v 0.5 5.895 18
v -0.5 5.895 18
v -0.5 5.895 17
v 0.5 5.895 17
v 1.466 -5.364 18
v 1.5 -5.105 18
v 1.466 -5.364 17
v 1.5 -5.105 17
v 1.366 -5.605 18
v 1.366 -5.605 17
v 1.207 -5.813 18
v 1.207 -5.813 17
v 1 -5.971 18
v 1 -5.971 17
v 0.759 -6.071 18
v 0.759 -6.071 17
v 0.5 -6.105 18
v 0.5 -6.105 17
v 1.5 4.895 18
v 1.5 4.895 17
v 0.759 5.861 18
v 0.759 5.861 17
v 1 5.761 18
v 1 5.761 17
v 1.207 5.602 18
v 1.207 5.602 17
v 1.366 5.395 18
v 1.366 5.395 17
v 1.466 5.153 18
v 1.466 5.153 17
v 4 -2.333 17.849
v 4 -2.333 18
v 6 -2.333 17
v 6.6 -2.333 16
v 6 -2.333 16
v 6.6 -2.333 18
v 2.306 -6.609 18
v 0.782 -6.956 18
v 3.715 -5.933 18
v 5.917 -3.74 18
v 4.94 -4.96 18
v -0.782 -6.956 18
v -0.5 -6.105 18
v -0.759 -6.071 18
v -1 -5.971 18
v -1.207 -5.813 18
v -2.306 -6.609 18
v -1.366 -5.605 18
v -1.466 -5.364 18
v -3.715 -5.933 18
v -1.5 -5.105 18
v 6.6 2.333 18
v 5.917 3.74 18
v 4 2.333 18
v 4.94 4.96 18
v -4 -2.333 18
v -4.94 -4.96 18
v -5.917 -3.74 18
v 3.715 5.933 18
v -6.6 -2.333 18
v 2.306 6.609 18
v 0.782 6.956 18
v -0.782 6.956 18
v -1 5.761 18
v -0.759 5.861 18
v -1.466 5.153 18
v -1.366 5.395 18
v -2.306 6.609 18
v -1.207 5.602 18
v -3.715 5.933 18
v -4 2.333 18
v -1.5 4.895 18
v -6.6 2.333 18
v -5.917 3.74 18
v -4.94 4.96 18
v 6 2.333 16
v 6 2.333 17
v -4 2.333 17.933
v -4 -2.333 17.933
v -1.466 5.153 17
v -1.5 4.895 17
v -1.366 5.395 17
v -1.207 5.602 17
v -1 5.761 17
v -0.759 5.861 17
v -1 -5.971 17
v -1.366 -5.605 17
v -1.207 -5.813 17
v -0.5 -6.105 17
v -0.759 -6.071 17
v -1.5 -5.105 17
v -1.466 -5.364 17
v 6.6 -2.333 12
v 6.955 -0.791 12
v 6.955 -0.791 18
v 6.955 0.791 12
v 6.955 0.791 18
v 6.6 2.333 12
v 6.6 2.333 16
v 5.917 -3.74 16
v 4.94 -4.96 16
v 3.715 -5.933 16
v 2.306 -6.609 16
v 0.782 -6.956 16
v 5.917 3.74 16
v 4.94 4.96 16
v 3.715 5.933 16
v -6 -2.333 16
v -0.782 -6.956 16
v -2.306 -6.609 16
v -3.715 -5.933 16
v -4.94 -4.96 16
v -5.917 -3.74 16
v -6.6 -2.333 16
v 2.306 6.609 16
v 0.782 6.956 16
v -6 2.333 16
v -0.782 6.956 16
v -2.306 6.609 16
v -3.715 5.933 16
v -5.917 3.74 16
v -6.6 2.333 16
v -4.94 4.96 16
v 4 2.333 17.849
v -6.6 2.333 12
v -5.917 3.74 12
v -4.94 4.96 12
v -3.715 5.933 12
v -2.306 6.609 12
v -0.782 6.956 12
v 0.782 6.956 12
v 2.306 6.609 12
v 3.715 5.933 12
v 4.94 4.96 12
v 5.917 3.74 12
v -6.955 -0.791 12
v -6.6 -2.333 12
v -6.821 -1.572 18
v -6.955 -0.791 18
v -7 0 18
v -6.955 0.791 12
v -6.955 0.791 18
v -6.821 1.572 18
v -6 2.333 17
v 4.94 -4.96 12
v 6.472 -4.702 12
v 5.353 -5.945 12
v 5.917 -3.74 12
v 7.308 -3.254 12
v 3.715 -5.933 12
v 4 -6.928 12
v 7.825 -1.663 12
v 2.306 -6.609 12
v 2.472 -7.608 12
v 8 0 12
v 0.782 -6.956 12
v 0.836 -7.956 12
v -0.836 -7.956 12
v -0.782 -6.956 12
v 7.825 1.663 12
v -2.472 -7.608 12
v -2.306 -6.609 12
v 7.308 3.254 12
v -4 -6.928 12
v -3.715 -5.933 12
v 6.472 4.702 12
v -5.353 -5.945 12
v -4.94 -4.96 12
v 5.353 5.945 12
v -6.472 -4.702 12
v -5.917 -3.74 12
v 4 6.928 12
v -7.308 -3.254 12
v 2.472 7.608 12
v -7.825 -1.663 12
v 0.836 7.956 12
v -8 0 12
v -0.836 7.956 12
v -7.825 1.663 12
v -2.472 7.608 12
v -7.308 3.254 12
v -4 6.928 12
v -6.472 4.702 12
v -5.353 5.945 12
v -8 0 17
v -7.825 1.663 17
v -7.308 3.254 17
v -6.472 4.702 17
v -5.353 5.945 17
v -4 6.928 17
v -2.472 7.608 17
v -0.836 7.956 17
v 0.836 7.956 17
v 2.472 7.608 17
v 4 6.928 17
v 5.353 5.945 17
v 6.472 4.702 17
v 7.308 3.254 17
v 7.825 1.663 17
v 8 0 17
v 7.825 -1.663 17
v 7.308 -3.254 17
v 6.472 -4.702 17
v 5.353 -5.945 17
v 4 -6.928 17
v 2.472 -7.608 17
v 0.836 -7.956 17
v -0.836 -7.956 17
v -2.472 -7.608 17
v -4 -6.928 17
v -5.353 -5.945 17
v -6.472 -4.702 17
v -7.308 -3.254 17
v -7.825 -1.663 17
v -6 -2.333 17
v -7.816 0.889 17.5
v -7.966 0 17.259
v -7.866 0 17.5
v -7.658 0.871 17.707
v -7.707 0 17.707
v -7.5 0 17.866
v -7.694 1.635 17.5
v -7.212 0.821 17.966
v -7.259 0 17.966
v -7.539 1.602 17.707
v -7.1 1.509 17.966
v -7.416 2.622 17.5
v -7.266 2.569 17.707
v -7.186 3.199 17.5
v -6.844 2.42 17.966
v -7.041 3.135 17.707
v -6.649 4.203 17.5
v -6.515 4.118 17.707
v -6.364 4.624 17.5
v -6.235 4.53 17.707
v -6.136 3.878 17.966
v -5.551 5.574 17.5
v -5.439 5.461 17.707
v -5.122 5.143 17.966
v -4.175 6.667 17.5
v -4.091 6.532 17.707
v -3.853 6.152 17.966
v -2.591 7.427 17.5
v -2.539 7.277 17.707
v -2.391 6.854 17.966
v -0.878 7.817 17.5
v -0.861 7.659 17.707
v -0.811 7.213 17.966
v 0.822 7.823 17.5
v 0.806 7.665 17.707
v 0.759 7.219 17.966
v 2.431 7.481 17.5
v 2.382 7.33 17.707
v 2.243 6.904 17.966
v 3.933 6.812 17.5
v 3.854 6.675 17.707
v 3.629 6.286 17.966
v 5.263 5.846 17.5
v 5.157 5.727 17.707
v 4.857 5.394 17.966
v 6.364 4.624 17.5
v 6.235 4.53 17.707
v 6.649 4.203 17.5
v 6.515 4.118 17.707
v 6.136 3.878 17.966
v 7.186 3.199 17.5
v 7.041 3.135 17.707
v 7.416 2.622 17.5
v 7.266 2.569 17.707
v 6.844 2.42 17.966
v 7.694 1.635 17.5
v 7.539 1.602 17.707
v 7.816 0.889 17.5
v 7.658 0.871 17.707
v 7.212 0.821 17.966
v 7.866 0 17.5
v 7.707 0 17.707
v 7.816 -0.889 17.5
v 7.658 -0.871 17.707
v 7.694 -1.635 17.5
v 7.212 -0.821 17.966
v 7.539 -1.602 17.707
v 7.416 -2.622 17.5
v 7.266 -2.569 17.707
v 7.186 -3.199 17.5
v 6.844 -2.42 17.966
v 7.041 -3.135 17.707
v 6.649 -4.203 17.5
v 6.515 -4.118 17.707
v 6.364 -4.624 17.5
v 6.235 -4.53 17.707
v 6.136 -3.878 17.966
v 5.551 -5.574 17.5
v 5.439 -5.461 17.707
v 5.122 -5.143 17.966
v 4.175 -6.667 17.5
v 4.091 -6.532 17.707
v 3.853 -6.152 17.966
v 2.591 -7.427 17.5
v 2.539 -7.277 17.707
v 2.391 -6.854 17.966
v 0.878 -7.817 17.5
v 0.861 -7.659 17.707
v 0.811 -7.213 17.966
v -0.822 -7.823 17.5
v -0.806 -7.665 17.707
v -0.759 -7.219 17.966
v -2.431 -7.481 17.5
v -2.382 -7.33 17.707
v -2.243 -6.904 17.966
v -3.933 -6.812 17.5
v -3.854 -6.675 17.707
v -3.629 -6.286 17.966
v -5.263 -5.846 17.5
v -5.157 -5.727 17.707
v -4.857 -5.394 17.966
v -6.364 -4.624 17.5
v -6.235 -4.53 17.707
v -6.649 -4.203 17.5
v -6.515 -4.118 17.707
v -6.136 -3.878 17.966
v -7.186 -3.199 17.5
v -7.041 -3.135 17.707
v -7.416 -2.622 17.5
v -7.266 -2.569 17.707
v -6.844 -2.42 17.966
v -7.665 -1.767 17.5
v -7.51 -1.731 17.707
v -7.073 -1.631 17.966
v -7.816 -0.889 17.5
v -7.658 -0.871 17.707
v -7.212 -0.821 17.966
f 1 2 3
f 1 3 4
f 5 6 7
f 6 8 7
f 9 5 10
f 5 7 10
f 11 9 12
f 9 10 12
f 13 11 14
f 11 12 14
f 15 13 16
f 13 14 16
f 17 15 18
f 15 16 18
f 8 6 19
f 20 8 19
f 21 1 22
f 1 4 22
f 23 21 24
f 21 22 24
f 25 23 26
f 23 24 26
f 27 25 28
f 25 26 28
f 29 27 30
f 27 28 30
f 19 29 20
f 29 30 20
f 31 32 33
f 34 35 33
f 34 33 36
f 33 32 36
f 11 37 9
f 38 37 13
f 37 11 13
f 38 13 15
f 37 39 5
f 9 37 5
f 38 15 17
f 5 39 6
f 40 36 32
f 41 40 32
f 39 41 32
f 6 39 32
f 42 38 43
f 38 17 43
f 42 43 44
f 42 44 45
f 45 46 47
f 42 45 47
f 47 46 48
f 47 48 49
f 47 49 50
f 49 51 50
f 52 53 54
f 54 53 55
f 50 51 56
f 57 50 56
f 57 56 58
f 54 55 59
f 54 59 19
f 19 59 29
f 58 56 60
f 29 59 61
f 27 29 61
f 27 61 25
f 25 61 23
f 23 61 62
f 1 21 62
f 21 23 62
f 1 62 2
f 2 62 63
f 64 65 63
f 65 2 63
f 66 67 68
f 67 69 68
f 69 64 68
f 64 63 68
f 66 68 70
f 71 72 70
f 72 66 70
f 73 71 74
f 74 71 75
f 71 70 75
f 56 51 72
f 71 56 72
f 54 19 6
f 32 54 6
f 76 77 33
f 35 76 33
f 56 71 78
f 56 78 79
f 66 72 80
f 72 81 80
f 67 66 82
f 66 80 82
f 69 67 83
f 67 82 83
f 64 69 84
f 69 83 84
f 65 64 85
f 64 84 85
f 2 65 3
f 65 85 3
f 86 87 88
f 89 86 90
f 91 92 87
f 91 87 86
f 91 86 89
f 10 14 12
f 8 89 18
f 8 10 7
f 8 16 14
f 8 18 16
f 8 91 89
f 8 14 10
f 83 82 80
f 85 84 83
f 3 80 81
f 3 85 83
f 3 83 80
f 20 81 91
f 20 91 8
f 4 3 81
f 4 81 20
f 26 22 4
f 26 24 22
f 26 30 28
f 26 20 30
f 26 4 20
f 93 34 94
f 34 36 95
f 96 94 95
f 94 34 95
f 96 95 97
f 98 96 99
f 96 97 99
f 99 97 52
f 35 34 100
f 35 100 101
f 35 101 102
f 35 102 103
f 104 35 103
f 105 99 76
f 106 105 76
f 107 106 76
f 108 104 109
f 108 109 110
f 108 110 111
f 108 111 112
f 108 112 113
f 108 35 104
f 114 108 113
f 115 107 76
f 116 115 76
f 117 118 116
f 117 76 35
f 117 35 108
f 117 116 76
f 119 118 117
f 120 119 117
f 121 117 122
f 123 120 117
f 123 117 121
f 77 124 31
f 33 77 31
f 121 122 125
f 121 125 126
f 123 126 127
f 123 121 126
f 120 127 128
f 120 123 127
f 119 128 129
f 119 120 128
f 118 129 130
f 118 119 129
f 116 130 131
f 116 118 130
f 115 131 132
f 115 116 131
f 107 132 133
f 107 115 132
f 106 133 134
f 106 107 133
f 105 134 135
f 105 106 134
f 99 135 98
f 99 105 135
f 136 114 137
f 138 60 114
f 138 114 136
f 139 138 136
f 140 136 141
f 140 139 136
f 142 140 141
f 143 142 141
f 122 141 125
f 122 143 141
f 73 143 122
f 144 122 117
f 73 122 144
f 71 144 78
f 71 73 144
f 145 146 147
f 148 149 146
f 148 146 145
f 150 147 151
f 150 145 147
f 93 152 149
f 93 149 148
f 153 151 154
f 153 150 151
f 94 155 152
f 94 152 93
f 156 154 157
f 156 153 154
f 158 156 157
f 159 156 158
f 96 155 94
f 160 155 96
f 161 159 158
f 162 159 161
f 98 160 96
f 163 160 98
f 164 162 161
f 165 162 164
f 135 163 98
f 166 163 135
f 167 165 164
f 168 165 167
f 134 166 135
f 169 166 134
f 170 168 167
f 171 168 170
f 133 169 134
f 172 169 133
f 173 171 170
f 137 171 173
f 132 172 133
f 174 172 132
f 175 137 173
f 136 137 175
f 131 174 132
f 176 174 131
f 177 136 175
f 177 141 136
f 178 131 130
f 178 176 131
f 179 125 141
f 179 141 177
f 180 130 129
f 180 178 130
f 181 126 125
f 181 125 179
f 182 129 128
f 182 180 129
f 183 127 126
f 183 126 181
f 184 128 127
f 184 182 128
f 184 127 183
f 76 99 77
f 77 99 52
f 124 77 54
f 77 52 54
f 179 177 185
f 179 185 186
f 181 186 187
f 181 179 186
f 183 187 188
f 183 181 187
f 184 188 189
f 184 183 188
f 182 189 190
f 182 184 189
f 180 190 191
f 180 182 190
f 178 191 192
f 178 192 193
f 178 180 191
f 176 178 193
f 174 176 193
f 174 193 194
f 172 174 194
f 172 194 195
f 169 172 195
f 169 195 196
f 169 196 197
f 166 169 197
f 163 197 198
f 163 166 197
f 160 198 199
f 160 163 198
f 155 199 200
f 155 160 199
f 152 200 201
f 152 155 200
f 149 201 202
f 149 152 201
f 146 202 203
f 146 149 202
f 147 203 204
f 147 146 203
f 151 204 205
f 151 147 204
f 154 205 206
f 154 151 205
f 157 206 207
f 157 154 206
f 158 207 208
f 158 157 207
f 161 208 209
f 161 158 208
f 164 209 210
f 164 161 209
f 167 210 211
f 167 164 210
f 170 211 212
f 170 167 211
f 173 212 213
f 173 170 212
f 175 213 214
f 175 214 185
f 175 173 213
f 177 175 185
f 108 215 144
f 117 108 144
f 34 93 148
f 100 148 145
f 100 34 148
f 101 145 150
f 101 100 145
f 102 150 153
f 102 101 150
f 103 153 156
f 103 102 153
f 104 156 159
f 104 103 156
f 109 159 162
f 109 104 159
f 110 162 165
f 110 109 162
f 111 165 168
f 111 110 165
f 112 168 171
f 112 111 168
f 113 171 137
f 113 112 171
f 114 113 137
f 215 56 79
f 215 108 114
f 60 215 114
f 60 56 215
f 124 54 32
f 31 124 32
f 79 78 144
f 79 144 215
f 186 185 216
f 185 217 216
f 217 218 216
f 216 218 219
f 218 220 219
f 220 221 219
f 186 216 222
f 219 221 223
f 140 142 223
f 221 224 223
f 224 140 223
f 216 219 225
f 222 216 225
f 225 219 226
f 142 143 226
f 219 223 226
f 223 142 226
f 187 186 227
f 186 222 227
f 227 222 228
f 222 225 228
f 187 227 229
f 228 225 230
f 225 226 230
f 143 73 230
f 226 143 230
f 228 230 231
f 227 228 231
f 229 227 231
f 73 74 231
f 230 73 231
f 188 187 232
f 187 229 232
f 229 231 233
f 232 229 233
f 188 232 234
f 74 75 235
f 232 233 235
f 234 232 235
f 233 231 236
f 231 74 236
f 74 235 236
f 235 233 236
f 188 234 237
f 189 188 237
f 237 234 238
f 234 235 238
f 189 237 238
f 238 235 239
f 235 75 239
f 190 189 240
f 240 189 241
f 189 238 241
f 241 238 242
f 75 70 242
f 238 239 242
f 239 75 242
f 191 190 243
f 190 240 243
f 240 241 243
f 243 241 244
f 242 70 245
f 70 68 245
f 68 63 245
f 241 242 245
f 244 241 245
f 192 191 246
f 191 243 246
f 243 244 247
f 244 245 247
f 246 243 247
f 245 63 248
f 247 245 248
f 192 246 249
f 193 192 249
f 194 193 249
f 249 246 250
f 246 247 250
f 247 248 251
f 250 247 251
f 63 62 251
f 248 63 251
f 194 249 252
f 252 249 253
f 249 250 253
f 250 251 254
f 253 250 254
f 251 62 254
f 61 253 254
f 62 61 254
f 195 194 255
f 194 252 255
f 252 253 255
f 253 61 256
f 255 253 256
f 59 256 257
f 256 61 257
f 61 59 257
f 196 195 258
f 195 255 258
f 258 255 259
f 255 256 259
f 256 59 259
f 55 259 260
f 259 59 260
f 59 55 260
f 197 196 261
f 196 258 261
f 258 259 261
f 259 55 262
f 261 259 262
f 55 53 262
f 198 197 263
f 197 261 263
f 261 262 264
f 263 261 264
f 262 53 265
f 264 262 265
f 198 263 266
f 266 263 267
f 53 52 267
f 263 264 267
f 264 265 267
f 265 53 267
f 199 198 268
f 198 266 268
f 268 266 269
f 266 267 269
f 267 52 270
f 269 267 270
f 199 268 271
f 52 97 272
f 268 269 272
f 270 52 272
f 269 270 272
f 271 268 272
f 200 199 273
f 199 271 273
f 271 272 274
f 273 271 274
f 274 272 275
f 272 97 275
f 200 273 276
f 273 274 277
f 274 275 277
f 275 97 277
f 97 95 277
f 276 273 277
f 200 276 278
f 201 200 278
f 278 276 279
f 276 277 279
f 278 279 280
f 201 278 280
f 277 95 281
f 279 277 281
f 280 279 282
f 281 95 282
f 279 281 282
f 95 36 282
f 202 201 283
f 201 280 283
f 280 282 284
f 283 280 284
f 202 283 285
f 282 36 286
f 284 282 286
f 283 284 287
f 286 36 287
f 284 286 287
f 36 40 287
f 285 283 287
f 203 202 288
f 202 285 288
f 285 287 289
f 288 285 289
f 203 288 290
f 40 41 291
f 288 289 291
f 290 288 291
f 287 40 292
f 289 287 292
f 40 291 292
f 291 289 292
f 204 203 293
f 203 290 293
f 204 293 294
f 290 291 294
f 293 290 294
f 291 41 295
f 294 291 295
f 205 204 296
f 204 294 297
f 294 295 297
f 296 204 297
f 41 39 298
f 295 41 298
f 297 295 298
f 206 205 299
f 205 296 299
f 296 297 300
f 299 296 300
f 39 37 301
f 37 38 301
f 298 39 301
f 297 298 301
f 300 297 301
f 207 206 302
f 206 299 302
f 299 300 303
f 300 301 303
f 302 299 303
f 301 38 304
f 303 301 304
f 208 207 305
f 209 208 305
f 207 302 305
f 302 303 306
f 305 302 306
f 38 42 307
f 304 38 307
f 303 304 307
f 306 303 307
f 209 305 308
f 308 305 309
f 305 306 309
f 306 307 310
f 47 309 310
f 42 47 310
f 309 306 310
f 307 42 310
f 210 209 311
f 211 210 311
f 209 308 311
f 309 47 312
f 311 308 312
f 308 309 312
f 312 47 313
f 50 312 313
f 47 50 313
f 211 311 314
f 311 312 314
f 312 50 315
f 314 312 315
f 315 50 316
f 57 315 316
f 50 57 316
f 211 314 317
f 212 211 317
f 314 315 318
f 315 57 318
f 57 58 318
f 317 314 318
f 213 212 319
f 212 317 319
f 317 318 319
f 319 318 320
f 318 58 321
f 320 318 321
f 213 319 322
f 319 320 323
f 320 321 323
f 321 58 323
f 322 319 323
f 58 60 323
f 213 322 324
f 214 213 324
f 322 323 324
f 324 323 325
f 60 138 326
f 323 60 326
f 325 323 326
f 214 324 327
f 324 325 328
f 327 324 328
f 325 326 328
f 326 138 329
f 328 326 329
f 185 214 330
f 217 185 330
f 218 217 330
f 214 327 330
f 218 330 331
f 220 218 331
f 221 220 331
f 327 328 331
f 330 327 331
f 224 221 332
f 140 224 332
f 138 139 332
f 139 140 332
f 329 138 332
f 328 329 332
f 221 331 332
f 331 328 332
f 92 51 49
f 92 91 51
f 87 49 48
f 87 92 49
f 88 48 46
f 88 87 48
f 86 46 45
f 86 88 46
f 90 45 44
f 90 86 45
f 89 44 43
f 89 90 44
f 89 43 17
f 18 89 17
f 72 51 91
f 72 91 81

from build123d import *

# Parameters (mm, degrees)
SKETCH_1_R          = 8
EXTRUDE_1_DEPTH     = 6
FILLET_1_R          = 1
SKETCH_3_W          = 3
SKETCH_3_H          = 12
CUT_EXTRUDE_1_DEPTH = 1
FILLET_2_R          = 1
CUT_EXTRUDE_2_DEPTH = 1
CHAMFER_2_SIZE      = 2
CHAMFER_2_SIZE2     = 0.932615316
CHAMFER_5_SIZE      = 2
CHAMFER_5_SIZE2     = 0.848949632
CUT_EXTRUDE_3_DEPTH = 8
CUT_EXTRUDE_START   = -4
SKETCH_7_R          = 7
CUT_EXTRUDE_4_DEPTH = 4


with BuildPart() as part:
    # 草图1 → 凸台-拉伸1 (new body)
    with BuildSketch(Plane(origin=(0, 0, 12), x_dir=(-1, 0, 0), z_dir=(0, 0, -1))):
        Circle(SKETCH_1_R)
    extrude(amount=-EXTRUDE_1_DEPTH)

    # 圆角1
    fillet_1_edges = [part.edges().sort_by_distance(p)[0] for p in [
        (8, 0, 18),
    ]]
    fillet(fillet_1_edges, radius=FILLET_1_R)

    # 草图3 → 切除-拉伸1 (cut)
    with BuildSketch(Plane.XY.offset(18)):
        with Locations((0, -0.105406486)):
            Rectangle(SKETCH_3_W, SKETCH_3_H)
    extrude(amount=-CUT_EXTRUDE_1_DEPTH, mode=Mode.SUBTRACT)

    # 圆角2
    fillet_2_edges = [part.edges().sort_by_distance(p)[0] for p in [
        (-1.5, -6.105406486, 17.5),
        (-1.5, 5.894593514, 17.5),
        (1.5, 5.894593514, 17.5),
        (1.5, -6.105406486, 17.5),
    ]]
    fillet(fillet_2_edges, radius=FILLET_2_R)

    # 草图4 → 切除-拉伸2 (cut)
    with BuildSketch(Plane.XY.offset(18)):
        with BuildLine():
            Line((-6.599663291, 2.333333333), (-4, 2.333333333))
            Line((-4, 2.333333333), (-4, -2.333333333))
            Line((-4, -2.333333333), (-6.599663291, -2.333333333))
            ThreePointArc((-6.599663291, -2.333333333), (-7, 0), (-6.599663291, 2.333333333))
        make_face()
        with BuildLine():
            Line((4, -2.333333333), (6.599663291, -2.333333333))
            ThreePointArc((6.599663291, -2.333333333), (7, 0), (6.599663291, 2.333333333))
            Line((6.599663291, 2.333333333), (4, 2.333333333))
            Line((4, 2.333333333), (4, -2.333333333))
        make_face()
    extrude(amount=-CUT_EXTRUDE_2_DEPTH, mode=Mode.SUBTRACT)

    # 倒角2
    chamfer_2_edges = [part.edges().sort_by_distance(p)[0] for p in [
        (-4, 0, 17),
    ]]
    chamfer_2_side = [part.faces().sort_by_distance(p)[0] for p in [
        (-5.436521823, 0, 17),
    ]]
    chamfer(chamfer_2_edges, length=CHAMFER_2_SIZE, length2=CHAMFER_2_SIZE2, reference=chamfer_2_side[0])

    # 倒角5
    chamfer_5_edges = [part.edges().sort_by_distance(p)[0] for p in [
        (4, 0, 17),
    ]]
    chamfer_5_side = [part.faces().sort_by_distance(p)[0] for p in [
        (5.436521823, 0, 17),
    ]]
    chamfer(chamfer_5_edges, length=CHAMFER_5_SIZE, length2=CHAMFER_5_SIZE2, reference=chamfer_5_side[0])

    # 草图6 → 切除-拉伸3 (cut)
    with BuildSketch(Plane.XY.offset(17)):
        with BuildLine():
            Line((-6.599663291, -2.333333333), (-6, -2.333333333))
            Line((-6, -2.333333333), (-6, 2.333333333))
            Line((-6, 2.333333333), (-6.599663291, 2.333333333))
            ThreePointArc((-6.599663291, 2.333333333), (-7, 0), (-6.599663291, -2.333333333))
        make_face()
        with BuildLine():
            Line((6.599663291, 2.333333333), (6, 2.333333333))
            Line((6, 2.333333333), (6, -2.333333333))
            Line((6, -2.333333333), (6.599663291, -2.333333333))
            ThreePointArc((6.599663291, -2.333333333), (7, 0), (6.599663291, 2.333333333))
        make_face()
    extrude(amount=-CUT_EXTRUDE_3_DEPTH, mode=Mode.SUBTRACT)

    # 草图7 → 切除-拉伸4 (cut)
    with BuildSketch(Plane(origin=(0, 0, 12), x_dir=(-1, 0, 0), z_dir=(0, 0, -1)).offset(CUT_EXTRUDE_START)):
        Circle(SKETCH_7_R)
    extrude(amount=CUT_EXTRUDE_4_DEPTH, mode=Mode.SUBTRACT)


solid = part.part
